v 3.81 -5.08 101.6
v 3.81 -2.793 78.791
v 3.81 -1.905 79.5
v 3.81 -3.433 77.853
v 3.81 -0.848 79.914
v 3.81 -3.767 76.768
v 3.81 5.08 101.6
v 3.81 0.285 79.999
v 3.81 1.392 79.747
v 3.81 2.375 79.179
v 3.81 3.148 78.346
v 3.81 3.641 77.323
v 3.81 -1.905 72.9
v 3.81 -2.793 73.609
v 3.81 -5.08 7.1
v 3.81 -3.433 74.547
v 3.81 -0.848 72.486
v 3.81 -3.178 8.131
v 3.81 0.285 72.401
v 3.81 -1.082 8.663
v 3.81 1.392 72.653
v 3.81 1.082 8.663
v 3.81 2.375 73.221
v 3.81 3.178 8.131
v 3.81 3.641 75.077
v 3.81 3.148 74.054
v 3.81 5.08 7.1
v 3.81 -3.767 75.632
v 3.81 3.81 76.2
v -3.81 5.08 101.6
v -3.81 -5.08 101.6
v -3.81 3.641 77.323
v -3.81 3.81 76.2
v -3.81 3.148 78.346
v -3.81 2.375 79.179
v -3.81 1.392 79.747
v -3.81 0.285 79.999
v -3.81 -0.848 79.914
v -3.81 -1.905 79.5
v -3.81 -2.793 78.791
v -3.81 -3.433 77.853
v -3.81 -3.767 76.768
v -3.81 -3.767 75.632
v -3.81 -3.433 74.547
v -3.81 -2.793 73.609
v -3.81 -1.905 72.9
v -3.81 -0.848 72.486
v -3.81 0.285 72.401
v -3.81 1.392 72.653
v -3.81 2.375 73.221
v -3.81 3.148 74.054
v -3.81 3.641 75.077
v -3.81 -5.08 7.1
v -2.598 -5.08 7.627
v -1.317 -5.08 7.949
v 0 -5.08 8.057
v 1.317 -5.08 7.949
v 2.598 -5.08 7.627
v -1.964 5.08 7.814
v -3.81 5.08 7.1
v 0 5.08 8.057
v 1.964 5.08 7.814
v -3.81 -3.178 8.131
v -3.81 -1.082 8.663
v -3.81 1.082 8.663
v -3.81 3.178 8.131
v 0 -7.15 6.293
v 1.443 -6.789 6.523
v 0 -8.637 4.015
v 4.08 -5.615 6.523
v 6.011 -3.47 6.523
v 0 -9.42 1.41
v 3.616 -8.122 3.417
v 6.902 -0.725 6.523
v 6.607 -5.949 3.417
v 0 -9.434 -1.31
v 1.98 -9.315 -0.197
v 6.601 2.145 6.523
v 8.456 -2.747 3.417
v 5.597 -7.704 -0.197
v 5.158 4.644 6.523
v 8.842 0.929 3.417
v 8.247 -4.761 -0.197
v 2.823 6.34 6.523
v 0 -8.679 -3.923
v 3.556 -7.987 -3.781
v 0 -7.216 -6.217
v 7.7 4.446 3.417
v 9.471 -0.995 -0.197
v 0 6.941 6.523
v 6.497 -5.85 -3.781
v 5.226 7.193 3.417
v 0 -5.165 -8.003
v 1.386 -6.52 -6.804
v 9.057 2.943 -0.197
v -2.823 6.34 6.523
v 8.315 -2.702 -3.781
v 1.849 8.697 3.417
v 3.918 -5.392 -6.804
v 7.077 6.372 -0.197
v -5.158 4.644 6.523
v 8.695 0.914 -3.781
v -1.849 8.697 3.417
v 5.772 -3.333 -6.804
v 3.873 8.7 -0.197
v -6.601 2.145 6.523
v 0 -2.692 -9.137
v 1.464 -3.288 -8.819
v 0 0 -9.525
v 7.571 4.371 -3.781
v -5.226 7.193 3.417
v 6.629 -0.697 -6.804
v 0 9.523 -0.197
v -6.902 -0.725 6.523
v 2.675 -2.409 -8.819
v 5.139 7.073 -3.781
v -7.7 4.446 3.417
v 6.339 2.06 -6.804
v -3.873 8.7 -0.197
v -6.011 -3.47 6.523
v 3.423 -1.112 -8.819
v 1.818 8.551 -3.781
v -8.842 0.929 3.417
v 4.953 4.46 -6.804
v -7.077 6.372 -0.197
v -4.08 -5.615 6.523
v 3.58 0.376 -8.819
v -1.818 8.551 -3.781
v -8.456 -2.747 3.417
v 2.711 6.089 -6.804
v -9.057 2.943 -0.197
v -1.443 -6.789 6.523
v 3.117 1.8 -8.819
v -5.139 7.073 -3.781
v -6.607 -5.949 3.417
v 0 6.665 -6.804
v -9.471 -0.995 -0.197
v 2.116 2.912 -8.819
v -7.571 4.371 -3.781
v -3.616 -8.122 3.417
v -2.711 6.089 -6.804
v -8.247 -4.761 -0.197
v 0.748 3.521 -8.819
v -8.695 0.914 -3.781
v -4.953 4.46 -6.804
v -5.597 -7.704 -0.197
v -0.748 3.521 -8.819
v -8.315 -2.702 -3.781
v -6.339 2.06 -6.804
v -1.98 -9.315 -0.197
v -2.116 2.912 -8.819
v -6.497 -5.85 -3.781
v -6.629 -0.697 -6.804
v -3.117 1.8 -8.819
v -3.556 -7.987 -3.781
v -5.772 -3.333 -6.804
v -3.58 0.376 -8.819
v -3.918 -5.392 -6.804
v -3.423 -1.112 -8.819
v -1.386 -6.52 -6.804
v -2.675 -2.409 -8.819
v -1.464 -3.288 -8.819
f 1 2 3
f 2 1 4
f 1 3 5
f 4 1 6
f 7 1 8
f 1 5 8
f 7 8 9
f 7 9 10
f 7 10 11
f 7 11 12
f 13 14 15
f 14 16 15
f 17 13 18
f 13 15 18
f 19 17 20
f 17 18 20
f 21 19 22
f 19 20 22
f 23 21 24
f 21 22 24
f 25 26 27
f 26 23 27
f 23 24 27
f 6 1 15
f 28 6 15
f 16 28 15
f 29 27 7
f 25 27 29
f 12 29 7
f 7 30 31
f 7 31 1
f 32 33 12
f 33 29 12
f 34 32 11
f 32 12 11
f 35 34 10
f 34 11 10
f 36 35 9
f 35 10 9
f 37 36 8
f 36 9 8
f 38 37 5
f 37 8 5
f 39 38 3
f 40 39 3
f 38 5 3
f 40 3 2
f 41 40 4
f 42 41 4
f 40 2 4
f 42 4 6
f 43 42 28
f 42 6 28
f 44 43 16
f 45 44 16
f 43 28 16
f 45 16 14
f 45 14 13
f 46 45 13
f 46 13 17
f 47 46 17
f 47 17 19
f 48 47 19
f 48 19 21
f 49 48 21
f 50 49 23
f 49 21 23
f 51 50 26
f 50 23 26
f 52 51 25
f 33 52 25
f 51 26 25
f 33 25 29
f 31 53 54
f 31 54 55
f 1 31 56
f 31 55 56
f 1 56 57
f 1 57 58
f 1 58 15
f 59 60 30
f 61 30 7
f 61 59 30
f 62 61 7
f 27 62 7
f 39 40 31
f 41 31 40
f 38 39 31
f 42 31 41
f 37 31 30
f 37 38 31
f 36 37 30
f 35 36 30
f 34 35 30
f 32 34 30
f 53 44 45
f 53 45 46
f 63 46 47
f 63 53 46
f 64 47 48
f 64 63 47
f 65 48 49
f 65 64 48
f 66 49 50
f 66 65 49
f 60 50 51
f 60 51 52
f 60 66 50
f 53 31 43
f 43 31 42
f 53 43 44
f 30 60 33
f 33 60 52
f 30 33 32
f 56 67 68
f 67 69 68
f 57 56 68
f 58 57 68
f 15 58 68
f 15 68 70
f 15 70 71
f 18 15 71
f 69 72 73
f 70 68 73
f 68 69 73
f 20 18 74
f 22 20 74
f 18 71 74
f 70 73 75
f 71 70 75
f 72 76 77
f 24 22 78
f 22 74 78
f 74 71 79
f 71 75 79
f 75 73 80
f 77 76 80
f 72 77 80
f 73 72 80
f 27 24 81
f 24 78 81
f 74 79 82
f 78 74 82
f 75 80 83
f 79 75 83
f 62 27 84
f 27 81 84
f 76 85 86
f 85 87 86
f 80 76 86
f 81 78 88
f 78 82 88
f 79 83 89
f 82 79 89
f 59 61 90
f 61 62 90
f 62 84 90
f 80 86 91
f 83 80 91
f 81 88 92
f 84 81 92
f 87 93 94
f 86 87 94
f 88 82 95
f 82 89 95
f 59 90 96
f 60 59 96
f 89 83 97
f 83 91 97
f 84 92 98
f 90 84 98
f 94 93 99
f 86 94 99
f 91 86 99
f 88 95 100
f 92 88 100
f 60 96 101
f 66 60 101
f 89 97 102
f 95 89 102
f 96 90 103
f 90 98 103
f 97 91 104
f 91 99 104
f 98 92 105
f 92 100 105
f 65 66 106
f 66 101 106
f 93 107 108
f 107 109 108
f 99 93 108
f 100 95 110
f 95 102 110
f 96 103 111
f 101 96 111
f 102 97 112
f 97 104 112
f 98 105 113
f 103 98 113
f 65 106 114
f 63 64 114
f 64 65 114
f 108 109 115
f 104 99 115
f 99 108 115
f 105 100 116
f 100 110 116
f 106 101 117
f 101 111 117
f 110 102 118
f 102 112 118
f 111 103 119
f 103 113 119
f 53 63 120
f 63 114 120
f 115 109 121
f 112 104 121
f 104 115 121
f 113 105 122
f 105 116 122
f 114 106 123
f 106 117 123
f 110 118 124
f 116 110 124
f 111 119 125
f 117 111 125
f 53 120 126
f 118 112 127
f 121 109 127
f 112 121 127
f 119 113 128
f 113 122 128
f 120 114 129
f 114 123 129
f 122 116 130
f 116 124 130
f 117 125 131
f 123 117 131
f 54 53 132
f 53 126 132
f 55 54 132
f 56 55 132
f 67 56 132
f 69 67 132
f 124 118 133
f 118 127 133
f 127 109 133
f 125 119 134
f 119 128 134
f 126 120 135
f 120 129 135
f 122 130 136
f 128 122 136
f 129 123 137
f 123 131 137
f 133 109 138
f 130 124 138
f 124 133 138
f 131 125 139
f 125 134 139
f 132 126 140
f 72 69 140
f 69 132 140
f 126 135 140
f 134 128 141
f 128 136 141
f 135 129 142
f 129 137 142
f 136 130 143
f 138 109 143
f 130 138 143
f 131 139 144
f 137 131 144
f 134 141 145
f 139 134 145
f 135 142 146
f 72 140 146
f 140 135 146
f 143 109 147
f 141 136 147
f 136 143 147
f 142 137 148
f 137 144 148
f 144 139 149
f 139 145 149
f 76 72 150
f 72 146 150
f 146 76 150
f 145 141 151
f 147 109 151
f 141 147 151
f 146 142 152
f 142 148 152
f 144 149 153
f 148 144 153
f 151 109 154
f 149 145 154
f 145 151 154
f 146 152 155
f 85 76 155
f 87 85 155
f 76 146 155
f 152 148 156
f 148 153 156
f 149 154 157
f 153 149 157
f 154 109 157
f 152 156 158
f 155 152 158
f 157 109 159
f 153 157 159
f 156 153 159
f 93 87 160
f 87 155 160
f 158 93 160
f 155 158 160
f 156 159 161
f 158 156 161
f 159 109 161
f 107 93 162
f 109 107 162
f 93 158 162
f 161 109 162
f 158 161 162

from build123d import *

# Parameters (mm, degrees)
F2_W          = 7.62
F2_H          = 10.1600026736
F3_DEPTH      = 101.6
F4_R          = 3.81
F5_DEPTH      = 9.526
F5_DEPTH_BACK = 9.526


with BuildPart() as f1:
    # F0 (on Right) → F1 (revolve)
    with BuildSketch(Plane.YZ):
        with BuildLine():
            ThreePointArc((0, 9.525), (-9.525, 0), (0, -9.525))
            Line((0, -9.525), (0, 9.525))
        make_face()
    revolve(axis=Axis((0, 0, 0), (0, 0, 1)))

    # F2 (on Top) → F3 (join)
    with BuildSketch(Plane.XY):
        Rectangle(F2_W, F2_H)
    extrude(amount=F3_DEPTH)

    # F4 (on Right) → F5 (cut, two sides)
    with BuildSketch(Plane.YZ) as f5_sk:
        with Locations((0, 76.2)):
            Circle(F4_R)
    extrude(amount=-F5_DEPTH, mode=Mode.SUBTRACT)
    extrude(f5_sk.sketch, amount=F5_DEPTH_BACK, mode=Mode.SUBTRACT)


solid = f1.part
